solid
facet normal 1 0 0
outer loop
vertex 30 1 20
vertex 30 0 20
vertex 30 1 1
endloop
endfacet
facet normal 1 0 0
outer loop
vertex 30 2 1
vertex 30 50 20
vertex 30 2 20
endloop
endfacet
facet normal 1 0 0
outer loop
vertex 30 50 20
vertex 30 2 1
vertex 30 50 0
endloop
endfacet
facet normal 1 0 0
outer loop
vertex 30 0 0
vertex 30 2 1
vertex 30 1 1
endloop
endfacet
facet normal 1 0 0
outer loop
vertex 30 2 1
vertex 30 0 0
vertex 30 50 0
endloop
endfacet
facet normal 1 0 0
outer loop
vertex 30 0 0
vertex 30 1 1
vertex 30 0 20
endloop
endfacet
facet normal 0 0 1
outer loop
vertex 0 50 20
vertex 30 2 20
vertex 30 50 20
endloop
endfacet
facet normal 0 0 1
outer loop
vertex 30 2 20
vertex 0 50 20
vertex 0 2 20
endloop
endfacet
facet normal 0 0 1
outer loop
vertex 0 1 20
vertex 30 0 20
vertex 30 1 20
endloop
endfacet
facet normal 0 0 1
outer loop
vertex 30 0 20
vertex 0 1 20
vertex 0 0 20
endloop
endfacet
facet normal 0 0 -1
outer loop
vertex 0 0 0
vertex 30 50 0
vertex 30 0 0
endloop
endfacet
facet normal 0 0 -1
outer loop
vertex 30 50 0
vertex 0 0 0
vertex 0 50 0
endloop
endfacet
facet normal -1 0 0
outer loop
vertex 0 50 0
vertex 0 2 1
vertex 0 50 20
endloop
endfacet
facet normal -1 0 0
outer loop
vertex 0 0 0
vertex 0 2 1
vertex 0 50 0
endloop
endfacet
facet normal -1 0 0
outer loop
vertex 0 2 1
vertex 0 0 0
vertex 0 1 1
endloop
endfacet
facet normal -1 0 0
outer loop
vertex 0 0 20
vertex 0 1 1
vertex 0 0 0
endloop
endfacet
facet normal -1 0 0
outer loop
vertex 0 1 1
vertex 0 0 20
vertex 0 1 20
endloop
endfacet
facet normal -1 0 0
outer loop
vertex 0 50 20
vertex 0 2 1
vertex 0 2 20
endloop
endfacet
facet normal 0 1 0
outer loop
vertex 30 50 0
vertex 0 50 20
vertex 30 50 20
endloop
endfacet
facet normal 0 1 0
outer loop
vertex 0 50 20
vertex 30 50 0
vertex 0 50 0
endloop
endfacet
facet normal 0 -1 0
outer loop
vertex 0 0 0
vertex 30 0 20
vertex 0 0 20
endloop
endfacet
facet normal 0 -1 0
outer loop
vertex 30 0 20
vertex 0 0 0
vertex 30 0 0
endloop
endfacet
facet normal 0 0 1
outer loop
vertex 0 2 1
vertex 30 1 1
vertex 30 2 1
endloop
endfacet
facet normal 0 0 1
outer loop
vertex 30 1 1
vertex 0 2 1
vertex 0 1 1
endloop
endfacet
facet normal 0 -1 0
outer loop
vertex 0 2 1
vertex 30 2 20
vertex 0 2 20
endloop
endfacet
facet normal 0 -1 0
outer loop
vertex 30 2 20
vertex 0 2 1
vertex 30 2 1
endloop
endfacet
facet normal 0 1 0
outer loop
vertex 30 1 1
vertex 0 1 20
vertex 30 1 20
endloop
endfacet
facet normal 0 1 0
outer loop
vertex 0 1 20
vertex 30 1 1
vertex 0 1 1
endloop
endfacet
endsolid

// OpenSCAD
difference()
{
  cube([30,50,20]);
  translate([-5,1,1]) cube([40,1,30]);
}
